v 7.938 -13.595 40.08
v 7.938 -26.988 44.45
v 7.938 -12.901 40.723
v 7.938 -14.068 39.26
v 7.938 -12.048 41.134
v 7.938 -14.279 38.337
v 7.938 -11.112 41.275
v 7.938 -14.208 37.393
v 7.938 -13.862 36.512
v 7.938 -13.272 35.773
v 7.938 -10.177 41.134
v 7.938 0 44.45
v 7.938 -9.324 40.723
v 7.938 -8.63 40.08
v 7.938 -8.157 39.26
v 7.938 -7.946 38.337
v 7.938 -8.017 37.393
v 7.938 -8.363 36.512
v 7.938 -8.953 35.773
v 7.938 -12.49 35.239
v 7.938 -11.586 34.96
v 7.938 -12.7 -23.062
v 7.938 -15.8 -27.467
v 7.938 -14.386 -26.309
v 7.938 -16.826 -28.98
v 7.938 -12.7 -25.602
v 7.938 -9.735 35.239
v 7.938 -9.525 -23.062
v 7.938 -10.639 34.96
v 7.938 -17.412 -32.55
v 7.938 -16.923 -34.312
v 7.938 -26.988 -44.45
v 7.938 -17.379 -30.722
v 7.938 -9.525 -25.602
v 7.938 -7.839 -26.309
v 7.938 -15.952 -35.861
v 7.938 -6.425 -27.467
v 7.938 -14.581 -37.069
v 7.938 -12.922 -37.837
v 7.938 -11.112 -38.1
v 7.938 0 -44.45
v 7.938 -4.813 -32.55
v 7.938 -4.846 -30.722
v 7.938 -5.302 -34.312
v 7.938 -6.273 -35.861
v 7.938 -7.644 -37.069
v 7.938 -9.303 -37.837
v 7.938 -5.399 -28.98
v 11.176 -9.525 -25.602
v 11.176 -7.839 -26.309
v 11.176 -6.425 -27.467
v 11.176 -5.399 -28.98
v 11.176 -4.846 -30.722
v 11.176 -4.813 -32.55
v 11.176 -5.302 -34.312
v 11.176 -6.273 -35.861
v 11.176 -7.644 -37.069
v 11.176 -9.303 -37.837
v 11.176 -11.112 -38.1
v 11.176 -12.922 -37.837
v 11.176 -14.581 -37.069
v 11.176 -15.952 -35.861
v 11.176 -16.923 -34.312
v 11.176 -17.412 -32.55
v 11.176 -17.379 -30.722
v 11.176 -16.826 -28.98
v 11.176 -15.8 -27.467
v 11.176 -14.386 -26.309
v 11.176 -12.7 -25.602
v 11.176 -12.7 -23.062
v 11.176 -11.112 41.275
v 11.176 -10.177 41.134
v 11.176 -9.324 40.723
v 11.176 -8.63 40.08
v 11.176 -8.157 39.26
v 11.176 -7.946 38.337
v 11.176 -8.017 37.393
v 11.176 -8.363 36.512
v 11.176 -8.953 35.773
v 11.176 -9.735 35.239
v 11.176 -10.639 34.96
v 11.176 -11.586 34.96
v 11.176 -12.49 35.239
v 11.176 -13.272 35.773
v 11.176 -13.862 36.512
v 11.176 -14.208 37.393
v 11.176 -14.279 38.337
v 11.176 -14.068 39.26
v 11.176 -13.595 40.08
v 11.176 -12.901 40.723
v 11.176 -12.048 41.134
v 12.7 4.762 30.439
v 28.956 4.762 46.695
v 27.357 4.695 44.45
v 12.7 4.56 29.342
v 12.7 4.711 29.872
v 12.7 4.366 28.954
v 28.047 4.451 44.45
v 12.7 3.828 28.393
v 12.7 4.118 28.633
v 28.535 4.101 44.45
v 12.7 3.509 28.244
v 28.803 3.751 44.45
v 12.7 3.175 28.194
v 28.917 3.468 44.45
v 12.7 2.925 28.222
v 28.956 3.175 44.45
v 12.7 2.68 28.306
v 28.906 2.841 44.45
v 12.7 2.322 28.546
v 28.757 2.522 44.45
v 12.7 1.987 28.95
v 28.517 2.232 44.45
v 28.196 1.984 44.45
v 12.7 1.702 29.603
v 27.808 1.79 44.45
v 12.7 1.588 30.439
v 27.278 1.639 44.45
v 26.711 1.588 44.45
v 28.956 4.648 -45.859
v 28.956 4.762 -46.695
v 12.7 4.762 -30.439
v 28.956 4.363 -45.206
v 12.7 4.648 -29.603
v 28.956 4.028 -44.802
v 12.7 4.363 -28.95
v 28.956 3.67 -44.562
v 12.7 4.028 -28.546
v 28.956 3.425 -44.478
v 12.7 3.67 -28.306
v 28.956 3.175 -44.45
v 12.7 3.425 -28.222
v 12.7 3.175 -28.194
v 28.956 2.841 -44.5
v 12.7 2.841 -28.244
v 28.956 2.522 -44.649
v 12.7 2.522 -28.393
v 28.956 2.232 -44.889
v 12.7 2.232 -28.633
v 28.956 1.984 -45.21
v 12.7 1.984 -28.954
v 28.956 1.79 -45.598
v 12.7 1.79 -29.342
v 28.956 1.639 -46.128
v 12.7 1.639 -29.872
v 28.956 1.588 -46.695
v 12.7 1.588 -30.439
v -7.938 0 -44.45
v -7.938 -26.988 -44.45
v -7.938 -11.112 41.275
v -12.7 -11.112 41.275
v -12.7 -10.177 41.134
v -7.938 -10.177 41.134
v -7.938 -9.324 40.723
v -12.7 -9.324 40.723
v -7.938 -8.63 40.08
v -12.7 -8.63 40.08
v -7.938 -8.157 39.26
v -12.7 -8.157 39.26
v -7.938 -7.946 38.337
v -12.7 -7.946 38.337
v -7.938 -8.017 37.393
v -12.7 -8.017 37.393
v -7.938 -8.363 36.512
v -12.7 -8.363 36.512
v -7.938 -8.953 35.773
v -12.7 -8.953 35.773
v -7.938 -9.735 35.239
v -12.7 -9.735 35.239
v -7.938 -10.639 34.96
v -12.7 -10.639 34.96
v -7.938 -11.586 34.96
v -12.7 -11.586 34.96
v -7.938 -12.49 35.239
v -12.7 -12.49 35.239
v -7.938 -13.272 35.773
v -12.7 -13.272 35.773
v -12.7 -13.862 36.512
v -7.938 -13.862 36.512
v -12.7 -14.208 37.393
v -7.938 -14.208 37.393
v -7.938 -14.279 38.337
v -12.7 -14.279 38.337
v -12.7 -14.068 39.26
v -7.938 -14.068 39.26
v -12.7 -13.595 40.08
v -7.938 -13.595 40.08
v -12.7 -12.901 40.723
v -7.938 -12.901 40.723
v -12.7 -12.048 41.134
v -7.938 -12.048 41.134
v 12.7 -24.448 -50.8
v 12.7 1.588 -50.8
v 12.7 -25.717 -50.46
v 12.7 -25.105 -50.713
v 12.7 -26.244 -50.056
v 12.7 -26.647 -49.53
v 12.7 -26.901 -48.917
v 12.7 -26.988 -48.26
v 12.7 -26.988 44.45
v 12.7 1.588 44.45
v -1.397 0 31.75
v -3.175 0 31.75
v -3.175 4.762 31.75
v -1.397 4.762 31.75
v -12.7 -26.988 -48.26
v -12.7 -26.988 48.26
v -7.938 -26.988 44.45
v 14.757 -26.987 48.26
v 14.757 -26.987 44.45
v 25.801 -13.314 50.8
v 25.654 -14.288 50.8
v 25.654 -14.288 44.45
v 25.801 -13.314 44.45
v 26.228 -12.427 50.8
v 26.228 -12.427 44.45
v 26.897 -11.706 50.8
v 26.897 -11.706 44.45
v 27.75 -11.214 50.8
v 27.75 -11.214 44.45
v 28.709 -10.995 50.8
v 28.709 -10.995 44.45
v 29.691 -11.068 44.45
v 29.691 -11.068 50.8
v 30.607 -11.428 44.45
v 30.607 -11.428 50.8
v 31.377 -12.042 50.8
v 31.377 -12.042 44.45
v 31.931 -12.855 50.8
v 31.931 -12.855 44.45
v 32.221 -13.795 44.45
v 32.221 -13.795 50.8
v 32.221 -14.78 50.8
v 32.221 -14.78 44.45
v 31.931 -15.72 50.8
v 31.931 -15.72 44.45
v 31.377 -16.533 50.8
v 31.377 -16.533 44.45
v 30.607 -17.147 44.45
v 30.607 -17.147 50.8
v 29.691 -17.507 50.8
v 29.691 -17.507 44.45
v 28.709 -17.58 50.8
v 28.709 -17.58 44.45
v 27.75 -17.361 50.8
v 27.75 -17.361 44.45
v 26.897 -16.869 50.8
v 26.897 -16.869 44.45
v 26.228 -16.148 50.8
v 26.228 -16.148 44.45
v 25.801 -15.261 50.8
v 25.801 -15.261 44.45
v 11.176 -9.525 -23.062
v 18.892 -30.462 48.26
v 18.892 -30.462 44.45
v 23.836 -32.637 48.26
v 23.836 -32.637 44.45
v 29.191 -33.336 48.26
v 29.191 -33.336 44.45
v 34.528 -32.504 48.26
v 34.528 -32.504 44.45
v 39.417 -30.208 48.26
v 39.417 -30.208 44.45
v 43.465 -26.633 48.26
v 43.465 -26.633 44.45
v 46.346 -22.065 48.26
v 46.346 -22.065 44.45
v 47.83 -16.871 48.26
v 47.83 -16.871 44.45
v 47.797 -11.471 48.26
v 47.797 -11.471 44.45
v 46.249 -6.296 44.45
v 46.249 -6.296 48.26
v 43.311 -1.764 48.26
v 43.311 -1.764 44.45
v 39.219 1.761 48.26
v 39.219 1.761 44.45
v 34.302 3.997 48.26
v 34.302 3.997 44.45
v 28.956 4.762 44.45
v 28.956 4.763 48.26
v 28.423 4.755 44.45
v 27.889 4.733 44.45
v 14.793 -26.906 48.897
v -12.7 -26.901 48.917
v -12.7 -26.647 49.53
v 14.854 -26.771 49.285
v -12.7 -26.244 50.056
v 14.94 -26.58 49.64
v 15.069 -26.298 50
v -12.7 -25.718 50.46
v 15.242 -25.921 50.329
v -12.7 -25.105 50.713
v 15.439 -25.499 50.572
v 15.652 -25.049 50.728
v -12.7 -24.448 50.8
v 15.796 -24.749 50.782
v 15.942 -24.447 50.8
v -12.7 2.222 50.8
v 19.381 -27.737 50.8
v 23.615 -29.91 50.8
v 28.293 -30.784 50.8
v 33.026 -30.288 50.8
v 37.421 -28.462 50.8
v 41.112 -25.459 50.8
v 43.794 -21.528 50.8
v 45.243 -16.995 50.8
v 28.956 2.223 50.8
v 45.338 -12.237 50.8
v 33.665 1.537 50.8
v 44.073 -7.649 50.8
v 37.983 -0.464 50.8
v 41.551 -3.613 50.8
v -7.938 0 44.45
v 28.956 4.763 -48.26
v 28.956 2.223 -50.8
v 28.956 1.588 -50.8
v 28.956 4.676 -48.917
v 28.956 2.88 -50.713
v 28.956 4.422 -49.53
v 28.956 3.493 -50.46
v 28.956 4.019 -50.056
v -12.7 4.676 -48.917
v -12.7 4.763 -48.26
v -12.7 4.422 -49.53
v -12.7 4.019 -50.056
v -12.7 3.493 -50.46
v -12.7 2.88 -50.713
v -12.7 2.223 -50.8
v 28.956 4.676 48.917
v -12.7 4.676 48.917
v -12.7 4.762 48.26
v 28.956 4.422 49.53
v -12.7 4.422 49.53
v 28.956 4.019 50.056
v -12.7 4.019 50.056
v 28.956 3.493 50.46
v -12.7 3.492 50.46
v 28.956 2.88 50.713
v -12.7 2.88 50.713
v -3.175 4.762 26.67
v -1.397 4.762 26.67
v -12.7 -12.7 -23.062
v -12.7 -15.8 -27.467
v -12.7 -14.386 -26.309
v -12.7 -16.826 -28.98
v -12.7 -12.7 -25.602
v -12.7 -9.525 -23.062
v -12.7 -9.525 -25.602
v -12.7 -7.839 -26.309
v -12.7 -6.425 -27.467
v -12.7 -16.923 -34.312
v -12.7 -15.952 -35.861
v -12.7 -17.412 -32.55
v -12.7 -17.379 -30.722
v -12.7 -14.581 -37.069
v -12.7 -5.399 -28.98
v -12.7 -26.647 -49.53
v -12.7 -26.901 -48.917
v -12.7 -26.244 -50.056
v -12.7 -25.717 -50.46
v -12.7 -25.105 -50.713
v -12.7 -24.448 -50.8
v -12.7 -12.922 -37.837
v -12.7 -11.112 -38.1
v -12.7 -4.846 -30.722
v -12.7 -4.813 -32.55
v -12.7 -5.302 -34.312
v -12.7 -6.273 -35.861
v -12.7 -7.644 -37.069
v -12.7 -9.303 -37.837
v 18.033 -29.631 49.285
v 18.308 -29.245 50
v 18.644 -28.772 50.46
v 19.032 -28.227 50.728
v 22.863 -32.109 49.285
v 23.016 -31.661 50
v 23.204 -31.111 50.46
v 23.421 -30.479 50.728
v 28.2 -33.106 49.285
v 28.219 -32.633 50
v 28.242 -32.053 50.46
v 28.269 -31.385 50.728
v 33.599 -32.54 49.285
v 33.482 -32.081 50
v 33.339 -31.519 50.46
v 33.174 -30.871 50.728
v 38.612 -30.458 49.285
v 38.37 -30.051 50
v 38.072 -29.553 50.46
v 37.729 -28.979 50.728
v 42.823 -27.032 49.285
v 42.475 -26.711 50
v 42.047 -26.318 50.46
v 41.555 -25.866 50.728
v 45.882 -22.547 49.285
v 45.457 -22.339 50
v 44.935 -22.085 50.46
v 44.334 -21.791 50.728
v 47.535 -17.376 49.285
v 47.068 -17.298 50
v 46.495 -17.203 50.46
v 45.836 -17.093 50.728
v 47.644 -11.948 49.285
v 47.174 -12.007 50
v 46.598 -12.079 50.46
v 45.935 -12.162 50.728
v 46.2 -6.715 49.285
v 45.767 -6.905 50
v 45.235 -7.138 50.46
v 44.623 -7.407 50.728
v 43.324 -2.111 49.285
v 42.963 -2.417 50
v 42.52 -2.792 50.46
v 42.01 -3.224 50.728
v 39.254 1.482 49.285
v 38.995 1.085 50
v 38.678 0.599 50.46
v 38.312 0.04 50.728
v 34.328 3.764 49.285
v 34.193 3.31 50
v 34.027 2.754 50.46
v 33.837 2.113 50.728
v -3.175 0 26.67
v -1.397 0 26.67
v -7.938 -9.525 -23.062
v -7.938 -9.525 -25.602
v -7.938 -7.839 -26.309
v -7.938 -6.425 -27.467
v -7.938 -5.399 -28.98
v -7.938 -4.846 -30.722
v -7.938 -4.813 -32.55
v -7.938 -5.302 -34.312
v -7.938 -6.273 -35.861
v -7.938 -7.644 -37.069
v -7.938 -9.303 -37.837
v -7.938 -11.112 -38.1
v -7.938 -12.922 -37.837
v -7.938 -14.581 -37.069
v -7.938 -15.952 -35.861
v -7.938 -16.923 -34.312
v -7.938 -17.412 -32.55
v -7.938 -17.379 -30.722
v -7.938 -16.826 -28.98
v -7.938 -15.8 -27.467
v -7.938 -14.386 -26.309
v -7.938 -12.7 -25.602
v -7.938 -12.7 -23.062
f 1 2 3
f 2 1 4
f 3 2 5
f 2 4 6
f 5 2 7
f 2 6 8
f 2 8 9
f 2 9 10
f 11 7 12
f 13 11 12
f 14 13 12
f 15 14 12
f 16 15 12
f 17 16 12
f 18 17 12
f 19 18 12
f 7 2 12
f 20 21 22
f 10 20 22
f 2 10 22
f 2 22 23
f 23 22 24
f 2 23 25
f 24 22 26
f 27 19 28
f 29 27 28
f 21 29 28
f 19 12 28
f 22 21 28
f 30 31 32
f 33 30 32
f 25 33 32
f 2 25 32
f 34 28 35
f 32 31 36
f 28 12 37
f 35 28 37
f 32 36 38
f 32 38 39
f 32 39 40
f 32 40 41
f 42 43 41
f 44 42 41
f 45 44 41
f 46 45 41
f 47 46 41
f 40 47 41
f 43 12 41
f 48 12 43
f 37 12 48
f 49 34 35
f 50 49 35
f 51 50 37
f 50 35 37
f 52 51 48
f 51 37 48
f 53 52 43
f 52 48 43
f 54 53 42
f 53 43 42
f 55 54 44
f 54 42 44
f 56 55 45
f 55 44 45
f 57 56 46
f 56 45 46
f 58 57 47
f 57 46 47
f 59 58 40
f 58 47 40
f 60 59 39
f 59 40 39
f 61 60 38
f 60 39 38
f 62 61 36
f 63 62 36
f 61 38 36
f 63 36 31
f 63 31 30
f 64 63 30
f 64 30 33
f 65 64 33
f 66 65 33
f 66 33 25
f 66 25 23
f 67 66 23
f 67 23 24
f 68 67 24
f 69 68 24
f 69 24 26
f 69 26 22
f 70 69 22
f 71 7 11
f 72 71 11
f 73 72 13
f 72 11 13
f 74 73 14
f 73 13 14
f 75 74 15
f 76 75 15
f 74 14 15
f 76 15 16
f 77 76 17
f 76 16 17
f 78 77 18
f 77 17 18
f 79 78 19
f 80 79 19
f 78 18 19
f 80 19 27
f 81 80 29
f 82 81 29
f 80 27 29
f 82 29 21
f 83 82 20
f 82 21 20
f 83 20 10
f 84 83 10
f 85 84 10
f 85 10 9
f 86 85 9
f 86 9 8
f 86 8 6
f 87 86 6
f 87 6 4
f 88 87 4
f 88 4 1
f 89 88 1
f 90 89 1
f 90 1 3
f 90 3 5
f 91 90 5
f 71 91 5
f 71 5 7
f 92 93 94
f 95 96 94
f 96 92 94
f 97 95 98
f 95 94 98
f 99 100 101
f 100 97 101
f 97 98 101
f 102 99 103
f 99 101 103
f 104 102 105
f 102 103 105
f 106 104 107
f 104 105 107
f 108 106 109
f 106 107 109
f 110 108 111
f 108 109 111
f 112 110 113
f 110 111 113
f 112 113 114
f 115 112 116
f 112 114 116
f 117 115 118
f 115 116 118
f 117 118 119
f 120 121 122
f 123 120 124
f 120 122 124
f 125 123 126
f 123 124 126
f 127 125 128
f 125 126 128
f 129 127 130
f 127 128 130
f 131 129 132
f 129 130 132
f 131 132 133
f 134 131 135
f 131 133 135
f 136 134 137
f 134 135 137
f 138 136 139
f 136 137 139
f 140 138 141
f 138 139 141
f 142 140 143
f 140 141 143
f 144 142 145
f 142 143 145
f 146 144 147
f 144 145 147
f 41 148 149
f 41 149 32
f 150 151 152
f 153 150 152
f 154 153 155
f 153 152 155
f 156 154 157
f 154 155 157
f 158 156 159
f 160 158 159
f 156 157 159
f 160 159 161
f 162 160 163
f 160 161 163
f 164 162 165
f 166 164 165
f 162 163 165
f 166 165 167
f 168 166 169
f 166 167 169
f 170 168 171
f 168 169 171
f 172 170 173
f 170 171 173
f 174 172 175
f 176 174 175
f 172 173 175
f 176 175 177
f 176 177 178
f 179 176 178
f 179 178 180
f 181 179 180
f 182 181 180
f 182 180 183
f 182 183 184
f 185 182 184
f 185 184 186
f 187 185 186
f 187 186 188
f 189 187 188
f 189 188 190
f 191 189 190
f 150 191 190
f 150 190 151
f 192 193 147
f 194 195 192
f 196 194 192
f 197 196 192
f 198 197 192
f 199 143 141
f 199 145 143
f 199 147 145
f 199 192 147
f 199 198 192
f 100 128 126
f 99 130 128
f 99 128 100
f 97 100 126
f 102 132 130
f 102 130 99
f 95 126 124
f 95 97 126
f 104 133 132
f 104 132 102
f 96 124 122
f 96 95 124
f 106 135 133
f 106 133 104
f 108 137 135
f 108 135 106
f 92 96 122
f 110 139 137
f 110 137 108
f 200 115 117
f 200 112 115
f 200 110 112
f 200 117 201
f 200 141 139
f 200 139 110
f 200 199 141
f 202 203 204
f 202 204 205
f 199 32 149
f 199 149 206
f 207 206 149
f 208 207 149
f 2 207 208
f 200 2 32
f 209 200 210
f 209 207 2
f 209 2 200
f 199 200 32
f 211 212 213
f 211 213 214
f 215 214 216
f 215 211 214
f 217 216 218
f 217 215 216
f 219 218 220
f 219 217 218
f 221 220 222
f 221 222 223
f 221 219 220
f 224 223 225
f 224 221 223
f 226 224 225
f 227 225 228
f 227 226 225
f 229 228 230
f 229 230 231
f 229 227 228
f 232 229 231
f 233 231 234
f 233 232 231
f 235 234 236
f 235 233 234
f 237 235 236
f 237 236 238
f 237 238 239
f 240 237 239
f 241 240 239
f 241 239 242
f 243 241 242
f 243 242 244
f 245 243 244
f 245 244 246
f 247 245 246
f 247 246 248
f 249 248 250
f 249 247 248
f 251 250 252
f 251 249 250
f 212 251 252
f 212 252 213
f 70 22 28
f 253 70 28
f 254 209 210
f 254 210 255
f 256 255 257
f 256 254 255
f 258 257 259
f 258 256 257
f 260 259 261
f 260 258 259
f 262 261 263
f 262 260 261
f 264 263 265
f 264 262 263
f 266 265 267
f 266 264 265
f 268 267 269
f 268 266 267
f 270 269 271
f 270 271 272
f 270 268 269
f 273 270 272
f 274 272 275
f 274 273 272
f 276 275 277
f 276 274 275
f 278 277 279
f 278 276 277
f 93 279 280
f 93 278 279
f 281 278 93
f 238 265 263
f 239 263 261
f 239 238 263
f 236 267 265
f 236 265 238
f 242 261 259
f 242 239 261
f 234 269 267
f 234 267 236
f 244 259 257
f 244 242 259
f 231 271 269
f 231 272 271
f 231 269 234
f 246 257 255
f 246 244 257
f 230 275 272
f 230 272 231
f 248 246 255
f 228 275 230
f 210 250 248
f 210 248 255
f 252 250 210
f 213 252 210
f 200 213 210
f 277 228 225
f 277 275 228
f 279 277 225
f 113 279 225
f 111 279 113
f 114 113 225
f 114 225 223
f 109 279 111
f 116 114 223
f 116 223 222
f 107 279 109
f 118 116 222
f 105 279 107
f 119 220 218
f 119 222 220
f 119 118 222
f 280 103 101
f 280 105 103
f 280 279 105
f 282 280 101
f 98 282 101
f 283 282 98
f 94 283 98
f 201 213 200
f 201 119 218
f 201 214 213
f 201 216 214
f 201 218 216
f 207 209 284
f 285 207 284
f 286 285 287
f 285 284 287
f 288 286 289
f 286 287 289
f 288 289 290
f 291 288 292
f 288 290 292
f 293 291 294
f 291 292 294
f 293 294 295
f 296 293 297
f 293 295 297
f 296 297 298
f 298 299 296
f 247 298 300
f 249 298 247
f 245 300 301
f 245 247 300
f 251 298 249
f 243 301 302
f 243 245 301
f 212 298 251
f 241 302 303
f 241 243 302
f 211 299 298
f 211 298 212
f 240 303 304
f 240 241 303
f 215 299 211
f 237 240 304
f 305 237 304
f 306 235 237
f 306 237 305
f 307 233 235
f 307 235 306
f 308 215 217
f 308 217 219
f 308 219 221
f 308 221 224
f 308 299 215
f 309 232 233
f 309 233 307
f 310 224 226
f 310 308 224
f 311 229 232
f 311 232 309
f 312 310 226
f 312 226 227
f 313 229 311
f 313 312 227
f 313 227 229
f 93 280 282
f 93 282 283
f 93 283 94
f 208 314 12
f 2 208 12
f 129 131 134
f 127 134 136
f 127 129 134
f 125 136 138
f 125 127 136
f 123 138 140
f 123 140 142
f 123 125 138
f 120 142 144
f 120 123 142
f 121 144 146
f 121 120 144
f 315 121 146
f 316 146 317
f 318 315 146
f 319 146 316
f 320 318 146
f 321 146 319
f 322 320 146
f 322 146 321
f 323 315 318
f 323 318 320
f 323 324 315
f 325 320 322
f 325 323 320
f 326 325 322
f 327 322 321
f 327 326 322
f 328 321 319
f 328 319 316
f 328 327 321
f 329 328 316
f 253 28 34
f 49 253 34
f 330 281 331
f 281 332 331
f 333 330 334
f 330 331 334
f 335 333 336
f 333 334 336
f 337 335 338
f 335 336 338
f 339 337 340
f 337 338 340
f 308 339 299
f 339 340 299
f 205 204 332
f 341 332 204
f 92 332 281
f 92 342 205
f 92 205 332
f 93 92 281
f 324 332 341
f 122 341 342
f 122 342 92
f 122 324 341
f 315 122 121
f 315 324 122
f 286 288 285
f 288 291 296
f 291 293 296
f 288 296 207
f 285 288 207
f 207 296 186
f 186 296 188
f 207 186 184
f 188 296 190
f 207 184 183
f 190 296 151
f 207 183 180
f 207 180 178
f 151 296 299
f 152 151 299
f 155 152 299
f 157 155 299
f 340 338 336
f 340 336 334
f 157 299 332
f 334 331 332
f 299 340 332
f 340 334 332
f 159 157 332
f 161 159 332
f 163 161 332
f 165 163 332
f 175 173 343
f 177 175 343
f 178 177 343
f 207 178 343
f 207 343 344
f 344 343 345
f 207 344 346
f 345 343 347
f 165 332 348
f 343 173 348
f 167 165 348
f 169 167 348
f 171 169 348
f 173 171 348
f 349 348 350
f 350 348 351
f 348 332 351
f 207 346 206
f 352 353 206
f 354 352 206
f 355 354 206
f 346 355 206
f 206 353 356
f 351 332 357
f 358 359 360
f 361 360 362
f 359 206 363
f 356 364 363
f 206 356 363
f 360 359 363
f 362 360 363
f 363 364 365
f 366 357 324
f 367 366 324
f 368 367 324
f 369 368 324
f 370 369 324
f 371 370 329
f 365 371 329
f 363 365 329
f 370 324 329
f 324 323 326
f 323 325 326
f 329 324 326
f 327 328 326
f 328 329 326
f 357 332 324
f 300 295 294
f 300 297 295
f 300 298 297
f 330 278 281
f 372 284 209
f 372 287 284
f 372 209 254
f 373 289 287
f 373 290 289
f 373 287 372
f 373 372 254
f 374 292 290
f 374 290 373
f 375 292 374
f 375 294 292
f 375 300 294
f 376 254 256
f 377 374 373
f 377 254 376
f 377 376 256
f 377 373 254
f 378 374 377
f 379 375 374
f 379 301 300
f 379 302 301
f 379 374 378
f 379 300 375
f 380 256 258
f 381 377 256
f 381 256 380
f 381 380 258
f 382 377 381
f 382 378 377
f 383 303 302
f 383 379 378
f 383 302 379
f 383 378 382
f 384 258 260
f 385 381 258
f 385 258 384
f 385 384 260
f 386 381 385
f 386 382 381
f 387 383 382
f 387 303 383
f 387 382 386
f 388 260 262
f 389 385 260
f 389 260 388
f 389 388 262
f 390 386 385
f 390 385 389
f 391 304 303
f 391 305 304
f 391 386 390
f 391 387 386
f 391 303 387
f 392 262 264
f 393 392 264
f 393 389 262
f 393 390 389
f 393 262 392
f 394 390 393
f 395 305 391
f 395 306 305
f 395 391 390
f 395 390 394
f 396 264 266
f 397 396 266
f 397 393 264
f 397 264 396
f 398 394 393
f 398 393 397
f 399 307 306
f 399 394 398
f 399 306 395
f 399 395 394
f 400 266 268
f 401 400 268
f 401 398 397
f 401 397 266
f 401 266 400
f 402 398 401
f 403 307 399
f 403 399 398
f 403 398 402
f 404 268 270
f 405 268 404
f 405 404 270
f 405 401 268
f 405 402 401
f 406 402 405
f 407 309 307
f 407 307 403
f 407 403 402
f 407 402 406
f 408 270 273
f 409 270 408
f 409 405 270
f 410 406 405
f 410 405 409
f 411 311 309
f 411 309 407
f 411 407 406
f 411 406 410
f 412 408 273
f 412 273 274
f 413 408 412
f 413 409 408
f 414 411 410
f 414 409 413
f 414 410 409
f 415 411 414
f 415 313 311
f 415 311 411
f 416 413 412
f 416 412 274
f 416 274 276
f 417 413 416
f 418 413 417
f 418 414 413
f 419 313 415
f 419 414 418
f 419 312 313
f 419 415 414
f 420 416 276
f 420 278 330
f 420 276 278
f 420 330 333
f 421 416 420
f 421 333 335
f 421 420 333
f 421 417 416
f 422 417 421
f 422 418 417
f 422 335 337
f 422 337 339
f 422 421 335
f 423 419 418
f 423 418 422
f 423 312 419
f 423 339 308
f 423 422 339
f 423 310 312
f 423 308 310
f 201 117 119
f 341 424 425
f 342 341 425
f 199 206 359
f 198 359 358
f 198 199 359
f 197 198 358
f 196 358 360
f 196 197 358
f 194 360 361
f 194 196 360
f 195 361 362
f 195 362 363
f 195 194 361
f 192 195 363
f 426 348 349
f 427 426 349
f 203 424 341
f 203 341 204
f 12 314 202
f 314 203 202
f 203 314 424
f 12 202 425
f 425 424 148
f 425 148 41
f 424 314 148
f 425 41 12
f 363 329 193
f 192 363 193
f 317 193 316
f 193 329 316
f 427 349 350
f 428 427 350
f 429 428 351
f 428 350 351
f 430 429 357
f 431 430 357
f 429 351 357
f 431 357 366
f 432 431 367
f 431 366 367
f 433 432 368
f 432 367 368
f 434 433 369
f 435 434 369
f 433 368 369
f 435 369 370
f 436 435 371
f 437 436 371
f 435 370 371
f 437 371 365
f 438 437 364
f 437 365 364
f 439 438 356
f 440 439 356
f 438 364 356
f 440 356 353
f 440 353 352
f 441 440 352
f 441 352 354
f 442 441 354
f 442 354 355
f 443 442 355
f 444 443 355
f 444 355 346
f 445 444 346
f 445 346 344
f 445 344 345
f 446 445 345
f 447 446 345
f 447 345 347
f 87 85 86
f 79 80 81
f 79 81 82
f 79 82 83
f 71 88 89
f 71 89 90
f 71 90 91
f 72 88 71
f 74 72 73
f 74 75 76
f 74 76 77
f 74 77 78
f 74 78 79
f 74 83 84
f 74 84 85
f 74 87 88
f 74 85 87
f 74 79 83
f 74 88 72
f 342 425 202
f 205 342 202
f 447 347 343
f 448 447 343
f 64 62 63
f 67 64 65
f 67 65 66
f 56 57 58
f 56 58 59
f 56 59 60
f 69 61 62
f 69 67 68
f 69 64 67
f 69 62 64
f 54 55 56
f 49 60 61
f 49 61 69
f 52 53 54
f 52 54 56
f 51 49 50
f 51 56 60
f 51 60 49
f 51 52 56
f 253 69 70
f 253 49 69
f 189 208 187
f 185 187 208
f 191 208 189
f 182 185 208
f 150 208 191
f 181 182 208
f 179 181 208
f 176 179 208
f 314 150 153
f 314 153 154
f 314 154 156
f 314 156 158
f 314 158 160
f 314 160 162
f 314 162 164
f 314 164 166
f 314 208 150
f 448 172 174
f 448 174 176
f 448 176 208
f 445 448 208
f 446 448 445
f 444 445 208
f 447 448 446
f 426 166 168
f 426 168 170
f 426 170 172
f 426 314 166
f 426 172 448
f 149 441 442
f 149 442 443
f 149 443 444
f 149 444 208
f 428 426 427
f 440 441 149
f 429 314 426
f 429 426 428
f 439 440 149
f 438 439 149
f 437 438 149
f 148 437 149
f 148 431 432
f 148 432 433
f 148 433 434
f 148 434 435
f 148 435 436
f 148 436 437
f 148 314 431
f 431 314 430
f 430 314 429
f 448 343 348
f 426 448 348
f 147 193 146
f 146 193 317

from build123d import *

# Parameters (mm, degrees)
SKETCH1_W             = 25.4
SKETCH1_H             = 101.6
TOP_DEPTH             = 4.7625
SKETCH2_W             = 25.4
SKETCH2_H             = 101.6
SKETCH2_W_2           = 15.875
SKETCH2_H_2           = 88.9
WALLS_DEPTH           = 31.75
SKETCH9_R             = 3.302
JOINT_HINGE_DEPTH     = 6.35
SKETCH3_R             = 3.175
SHAFT_HOLES_DEPTH     = 23.876
SKETCH13_W            = 1.778
SKETCH13_H            = 5.08
WIRE_LOFT_MOUNT_DEPTH = 12.7
ANTI_FLEX_DEPTH       = 3.175
FILLET1_R             = 2.54
FILLET2_R             = 1.5875


with BuildPart() as part:
    # Sketch1 → Top (new body)
    with BuildSketch(Plane(origin=(0, 0, 0), x_dir=(1, 0, 0), z_dir=(0, 1, 0))):
        Rectangle(SKETCH1_W, SKETCH1_H)
    extrude(amount=TOP_DEPTH)

    # Sketch2 → Walls (add)
    with BuildSketch(Plane(origin=(0, 4.7625, 0), x_dir=(1, 0, 0), z_dir=(0, 1, 0))):
        Rectangle(SKETCH2_W, SKETCH2_H)
        Rectangle(SKETCH2_W_2, SKETCH2_H_2, mode=Mode.SUBTRACT)
    extrude(amount=-WALLS_DEPTH)

    # Sketch9 → Joint Hinge (add)
    with BuildSketch(Plane(origin=(0, 0, 50.8), x_dir=(-1, 0, 0), z_dir=(0, 0, -1))):
        with BuildLine():
            Line((-28.956, 4.7625), (-12.7, 4.7625))
            Line((-12.7, 4.7625), (-12.7, -26.9875))
            Line((-12.7, -26.9875), (-14.756968343, -26.9875))
            ThreePointArc((-14.756968343, -26.9875), (-46.346191201, -22.064629933), (-28.956, 4.7625))
        make_face()
        with Locations((-28.956, -14.2875)):
            Circle(SKETCH9_R, mode=Mode.SUBTRACT)
    extrude(amount=JOINT_HINGE_DEPTH)

    # Sketch3 → Shaft holes (cut)
    with BuildSketch(Plane.ZY.offset(12.7)):
        with Locations((38.1, -11.1125)):
            Circle(SKETCH3_R)
        with BuildLine():
            Line((-25.601638938, -12.7), (-23.061638938, -12.7))
            Line((-23.061638938, -12.7), (-23.061638938, -9.525))
            Line((-23.061638938, -9.525), (-25.601638938, -9.525))
            ThreePointArc((-25.601638938, -9.525), (-38.1, -11.1125), (-25.601638938, -12.7))
        make_face()
    extrude(amount=-SHAFT_HOLES_DEPTH, mode=Mode.SUBTRACT)

    # Sketch13 → Wire Loft Mount (cut)
    with BuildSketch(Plane.XZ):
        with Locations((-2.286, 29.21)):
            Rectangle(SKETCH13_W, SKETCH13_H)
    extrude(amount=-WIRE_LOFT_MOUNT_DEPTH, mode=Mode.SUBTRACT)

    # Sketch15 → Anti-flex (add)
    with BuildSketch(Plane(origin=(0, 4.7625, 0), x_dir=(1, 0, 0), z_dir=(0, 1, 0))):
        Polygon((12.7, -44.45), (28.956, -44.45), (12.7, -28.194), align=None)
        Polygon((12.7, 28.194), (28.956, 44.45), (28.956, 50.8), (12.7, 50.8), align=None)
    extrude(amount=-ANTI_FLEX_DEPTH)

    # Fillet1
    fillet1_edges = [part.edges().sort_by_distance(p)[0] for p in [
        (8.128, 4.7625, -50.8),
        (0, -26.9875, -50.8),
        (1.028484171, -26.9875, 50.8),
        (46.346191201, -22.064629933, 50.8),
        (8.128, 4.7625, 50.8),
    ]]
    fillet(fillet1_edges, radius=FILLET1_R)

    # Fillet2
    # the kernel refuses this fillet: 1.5875 mm, written as the material it takes off along each edge
    with BuildSketch(Plane(origin=(9.893669962, 1.5875, -25.387669962), x_dir=(-0.7071067811865515, 0, -0.7071067811865436), z_dir=(0.7071067811865437, 0, -0.7071067811865515))) as fillet2_piece_1_section:
        with BuildLine():
            CenterArc((FILLET2_R, FILLET2_R), FILLET2_R, 180, 90)
            Line((0, FILLET2_R), (0, 0))
            Line((0, 0), (FILLET2_R, 0))
        make_face()
    fillet2_piece_1 = extrude(amount=30.92695567, mode=Mode.PRIVATE)
    fillet2_piece_1 = split(fillet2_piece_1, bisect_by=Plane(origin=(12.7, 1.942096603, -36.823475324), z_dir=(1, 0, 0)), keep=Keep.TOP, mode=Mode.PRIVATE)
    add(fillet2_piece_1, mode=Mode.SUBTRACT)
    with BuildSketch(Plane(origin=(9.893669962, 4.7625, -25.387669962), x_dir=(-0.7071067811865515, 0, -0.7071067811865436), z_dir=(0.7071067811865437, 0, -0.7071067811865515))) as fillet2_piece_2_section:
        with BuildLine():
            CenterArc((FILLET2_R, -FILLET2_R), FILLET2_R, 90, 90)
            Line((0, -FILLET2_R), (0, 0))
            Line((0, 0), (FILLET2_R, 0))
        make_face()
    fillet2_piece_2 = extrude(amount=30.92695567, mode=Mode.PRIVATE)
    fillet2_piece_2 = split(fillet2_piece_2, bisect_by=Plane(origin=(12.7, 4.407903397, -36.823475324), z_dir=(1, 0, 0)), keep=Keep.TOP, mode=Mode.PRIVATE)
    add(fillet2_piece_2, mode=Mode.SUBTRACT)
    with BuildSketch(Plane(origin=(31.762330038, 1.5875, 47.256330038), x_dir=(-0.7071067811865436, 0, 0.7071067811865515), z_dir=(-0.7071067811865515, 0, -0.7071067811865436))) as fillet2_piece_3_section:
        with BuildLine():
            CenterArc((FILLET2_R, FILLET2_R), FILLET2_R, 180, 90)
            Line((0, FILLET2_R), (0, 0))
            Line((0, 0), (FILLET2_R, 0))
        make_face()
    fillet2_piece_3 = extrude(amount=30.92695567, mode=Mode.PRIVATE)
    fillet2_piece_3 = split(fillet2_piece_3, bisect_by=Plane(origin=(12.7, 1.946775649, 36.567113542), z_dir=(1, 0, 0)), keep=Keep.TOP, mode=Mode.PRIVATE)
    fillet2_piece_3 = split(fillet2_piece_3, bisect_by=Plane(origin=(20.582886458, 1.946775649, 44.45), z_dir=(0, 0, -1)), keep=Keep.TOP, mode=Mode.PRIVATE)
    add(fillet2_piece_3, mode=Mode.SUBTRACT)
    with BuildSketch(Plane(origin=(31.762330038, 4.7625, 47.256330038), x_dir=(-0.7071067811865436, 0, 0.7071067811865515), z_dir=(-0.7071067811865515, 0, -0.7071067811865436))) as fillet2_piece_4_section:
        with BuildLine():
            CenterArc((FILLET2_R, -FILLET2_R), FILLET2_R, 90, 90)
            Line((0, -FILLET2_R), (0, 0))
            Line((0, 0), (FILLET2_R, 0))
        make_face()
    fillet2_piece_4 = extrude(amount=30.92695567, mode=Mode.PRIVATE)
    fillet2_piece_4 = split(fillet2_piece_4, bisect_by=Plane(origin=(12.7, 4.227310256, 42.469450936), z_dir=(1, 0, 0)), keep=Keep.TOP, mode=Mode.PRIVATE)
    fillet2_piece_4 = split(fillet2_piece_4, bisect_by=Plane(origin=(26.668449599, 4.227310256, 44.45), z_dir=(0, 0, -1)), keep=Keep.TOP, mode=Mode.PRIVATE)
    add(fillet2_piece_4, mode=Mode.SUBTRACT)
    with BuildSketch(Plane(origin=(31.762330038, 4.7625, 47.256330038), x_dir=(-0.7071067811865436, 0, 0.7071067811865515), z_dir=(-0.7071067811865515, 0, -0.7071067811865436))) as fillet2_piece_5_section:
        with BuildLine():
            CenterArc((FILLET2_R, -FILLET2_R), FILLET2_R, 90, 90)
            Line((0, -FILLET2_R), (0, 0))
            Line((0, 0), (FILLET2_R, 0))
        make_face()
    fillet2_piece_5 = extrude(amount=30.92695567, mode=Mode.PRIVATE)
    fillet2_piece_5 = split(fillet2_piece_5, bisect_by=Plane(origin=(27.86835314, 4.749091996, 44.45), z_dir=(0, 0, 1)), keep=Keep.TOP, mode=Mode.PRIVATE)
    fillet2_piece_5 = fillet2_piece_5 - Plane(origin=(28.956, -14.2875, 44.898632057), x_dir=(-0.7453559924999297, -0.6666666666666669, 0), z_dir=(0, 0, 1)) * Cylinder(19.05, 69, mode=Mode.PRIVATE)
    add(fillet2_piece_5, mode=Mode.SUBTRACT)


solid = part.part
